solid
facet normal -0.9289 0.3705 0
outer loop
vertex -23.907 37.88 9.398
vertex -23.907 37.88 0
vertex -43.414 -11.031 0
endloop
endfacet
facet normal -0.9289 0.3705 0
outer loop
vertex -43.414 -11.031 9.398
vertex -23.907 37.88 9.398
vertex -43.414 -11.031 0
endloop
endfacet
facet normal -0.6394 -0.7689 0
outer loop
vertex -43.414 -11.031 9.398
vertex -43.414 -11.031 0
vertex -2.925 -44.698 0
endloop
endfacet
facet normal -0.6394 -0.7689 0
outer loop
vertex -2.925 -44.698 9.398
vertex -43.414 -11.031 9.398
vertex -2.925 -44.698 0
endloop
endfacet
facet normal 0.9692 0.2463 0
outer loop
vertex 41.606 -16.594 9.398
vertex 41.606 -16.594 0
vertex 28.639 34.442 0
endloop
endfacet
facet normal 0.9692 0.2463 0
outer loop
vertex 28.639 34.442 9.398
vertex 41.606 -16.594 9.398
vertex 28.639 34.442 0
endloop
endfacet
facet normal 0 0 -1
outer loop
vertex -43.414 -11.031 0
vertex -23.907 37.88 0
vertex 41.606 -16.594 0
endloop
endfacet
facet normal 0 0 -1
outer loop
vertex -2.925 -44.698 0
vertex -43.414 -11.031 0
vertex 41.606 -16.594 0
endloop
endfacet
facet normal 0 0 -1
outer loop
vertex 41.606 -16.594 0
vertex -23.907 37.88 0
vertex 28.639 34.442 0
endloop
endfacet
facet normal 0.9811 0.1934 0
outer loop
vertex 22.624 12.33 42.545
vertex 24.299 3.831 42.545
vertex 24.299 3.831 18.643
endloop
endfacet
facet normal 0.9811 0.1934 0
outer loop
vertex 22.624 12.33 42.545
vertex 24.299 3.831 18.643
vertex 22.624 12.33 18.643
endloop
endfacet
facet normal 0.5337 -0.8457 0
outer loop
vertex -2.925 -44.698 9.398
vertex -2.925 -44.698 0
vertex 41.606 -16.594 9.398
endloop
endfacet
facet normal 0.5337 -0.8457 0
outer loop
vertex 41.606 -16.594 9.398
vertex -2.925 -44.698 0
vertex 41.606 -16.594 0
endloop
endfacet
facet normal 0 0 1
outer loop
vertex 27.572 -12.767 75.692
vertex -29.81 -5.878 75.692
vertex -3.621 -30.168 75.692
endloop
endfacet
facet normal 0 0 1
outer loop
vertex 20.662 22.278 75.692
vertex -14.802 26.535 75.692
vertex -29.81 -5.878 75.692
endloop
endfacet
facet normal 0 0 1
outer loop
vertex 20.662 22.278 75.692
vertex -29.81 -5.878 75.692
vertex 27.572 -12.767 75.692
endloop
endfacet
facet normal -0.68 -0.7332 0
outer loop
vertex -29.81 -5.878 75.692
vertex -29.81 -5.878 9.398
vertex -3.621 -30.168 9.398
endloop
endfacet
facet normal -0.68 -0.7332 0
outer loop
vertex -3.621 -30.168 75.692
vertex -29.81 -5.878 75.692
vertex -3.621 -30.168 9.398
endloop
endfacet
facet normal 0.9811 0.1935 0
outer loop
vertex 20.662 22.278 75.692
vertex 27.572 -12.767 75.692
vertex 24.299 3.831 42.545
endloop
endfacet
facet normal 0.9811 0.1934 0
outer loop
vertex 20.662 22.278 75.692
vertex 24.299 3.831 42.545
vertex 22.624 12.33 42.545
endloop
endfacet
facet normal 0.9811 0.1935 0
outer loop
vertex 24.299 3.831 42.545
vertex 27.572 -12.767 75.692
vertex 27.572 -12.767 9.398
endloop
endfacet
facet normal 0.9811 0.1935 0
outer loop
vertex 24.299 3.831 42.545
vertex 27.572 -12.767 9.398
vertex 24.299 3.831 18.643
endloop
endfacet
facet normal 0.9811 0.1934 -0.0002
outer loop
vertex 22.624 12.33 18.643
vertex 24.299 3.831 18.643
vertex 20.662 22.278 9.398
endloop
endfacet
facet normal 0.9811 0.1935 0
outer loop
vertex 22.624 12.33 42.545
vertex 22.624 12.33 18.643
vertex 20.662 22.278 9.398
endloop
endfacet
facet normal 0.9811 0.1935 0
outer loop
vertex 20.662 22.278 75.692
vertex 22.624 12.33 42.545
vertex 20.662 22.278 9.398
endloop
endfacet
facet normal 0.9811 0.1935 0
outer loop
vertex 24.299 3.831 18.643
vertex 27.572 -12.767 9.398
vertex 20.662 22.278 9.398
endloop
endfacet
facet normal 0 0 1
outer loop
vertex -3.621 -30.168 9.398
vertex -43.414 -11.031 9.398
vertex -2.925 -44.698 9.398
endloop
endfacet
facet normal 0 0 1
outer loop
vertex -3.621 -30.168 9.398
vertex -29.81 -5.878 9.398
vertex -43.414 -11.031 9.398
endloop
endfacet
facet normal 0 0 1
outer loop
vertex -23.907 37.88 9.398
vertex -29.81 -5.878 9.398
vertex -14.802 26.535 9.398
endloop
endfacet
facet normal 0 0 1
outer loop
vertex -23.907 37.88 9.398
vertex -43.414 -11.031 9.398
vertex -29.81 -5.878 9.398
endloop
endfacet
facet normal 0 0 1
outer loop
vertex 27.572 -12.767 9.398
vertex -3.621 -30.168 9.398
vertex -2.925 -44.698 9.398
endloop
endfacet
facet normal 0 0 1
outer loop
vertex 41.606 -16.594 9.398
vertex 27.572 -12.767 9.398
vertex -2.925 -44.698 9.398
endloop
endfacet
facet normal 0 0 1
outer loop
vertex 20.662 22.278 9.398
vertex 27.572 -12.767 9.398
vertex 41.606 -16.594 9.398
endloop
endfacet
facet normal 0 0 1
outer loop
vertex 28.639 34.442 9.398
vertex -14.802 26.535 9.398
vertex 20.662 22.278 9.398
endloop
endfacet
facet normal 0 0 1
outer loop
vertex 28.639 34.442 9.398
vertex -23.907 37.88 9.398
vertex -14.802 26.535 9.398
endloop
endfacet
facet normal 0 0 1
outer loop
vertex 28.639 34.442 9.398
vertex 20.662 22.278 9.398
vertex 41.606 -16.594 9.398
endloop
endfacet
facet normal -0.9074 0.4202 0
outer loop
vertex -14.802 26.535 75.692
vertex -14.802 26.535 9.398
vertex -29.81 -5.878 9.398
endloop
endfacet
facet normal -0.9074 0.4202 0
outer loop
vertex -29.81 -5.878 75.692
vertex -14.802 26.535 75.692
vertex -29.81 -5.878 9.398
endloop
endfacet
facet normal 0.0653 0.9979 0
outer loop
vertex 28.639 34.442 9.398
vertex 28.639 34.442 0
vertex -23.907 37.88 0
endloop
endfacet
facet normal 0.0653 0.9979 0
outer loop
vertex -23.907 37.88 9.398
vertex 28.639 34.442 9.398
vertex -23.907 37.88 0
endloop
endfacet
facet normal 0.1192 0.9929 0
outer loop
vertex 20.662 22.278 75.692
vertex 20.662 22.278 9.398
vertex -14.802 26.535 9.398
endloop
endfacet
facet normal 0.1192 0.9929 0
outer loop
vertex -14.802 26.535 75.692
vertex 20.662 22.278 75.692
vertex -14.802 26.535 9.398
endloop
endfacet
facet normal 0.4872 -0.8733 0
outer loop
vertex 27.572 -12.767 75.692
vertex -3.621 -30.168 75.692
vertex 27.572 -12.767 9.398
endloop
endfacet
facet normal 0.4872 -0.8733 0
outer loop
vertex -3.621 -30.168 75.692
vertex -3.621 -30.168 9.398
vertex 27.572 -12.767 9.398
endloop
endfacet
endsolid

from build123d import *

# Parameters (mm, degrees)
F1_DEPTH = 9.398
F3_DEPTH = 50.292
F4_DEPTH = 25.4
F6_W     = 14.479677
F6_H     = 23.901559
F7_DEPTH = 8.89


with BuildPart() as f1:
    # F0 (on Top) → F1 (new body)
    with BuildSketch(Plane.XY):
        Polygon((-2.924524, -44.697735), (41.606344, -16.593747), (28.638659, 34.442235), (-23.90668, 37.880219), (-43.4138, -11.030972), align=None)
    extrude(amount=F1_DEPTH)

    # F2 (on Top) → F3 (join)
    with BuildSketch(Plane.XY):
        Polygon((-3.621473, -30.167894), (27.572275, -12.766617), (20.662076, 22.27769), (-14.80241, 26.534987), (-29.810468, -5.878166), align=None)
    extrude(amount=F3_DEPTH)

    # F3_face (on face) → F4 (join)
    with BuildSketch(Plane.XY.offset(50.292)):
        Polygon((-29.810468, -5.878166), (-3.621473, -30.167894), (27.572275, -12.766617), (20.662076, 22.27769), (-14.80241, 26.534987), align=None)
    extrude(amount=F4_DEPTH)

    # F6 (on face) → F7 (join)
    with BuildSketch(Plane(origin=(24.117176, 4.755536, 0), x_dir=(-0.193459, 0.981108, 0), z_dir=(0.981108, 0.193459, 0))):
        with Locations((0.480323, 30.59422)):
            Rectangle(F6_W, F6_H)
    extrude(amount=-F7_DEPTH)


solid = f1.part
